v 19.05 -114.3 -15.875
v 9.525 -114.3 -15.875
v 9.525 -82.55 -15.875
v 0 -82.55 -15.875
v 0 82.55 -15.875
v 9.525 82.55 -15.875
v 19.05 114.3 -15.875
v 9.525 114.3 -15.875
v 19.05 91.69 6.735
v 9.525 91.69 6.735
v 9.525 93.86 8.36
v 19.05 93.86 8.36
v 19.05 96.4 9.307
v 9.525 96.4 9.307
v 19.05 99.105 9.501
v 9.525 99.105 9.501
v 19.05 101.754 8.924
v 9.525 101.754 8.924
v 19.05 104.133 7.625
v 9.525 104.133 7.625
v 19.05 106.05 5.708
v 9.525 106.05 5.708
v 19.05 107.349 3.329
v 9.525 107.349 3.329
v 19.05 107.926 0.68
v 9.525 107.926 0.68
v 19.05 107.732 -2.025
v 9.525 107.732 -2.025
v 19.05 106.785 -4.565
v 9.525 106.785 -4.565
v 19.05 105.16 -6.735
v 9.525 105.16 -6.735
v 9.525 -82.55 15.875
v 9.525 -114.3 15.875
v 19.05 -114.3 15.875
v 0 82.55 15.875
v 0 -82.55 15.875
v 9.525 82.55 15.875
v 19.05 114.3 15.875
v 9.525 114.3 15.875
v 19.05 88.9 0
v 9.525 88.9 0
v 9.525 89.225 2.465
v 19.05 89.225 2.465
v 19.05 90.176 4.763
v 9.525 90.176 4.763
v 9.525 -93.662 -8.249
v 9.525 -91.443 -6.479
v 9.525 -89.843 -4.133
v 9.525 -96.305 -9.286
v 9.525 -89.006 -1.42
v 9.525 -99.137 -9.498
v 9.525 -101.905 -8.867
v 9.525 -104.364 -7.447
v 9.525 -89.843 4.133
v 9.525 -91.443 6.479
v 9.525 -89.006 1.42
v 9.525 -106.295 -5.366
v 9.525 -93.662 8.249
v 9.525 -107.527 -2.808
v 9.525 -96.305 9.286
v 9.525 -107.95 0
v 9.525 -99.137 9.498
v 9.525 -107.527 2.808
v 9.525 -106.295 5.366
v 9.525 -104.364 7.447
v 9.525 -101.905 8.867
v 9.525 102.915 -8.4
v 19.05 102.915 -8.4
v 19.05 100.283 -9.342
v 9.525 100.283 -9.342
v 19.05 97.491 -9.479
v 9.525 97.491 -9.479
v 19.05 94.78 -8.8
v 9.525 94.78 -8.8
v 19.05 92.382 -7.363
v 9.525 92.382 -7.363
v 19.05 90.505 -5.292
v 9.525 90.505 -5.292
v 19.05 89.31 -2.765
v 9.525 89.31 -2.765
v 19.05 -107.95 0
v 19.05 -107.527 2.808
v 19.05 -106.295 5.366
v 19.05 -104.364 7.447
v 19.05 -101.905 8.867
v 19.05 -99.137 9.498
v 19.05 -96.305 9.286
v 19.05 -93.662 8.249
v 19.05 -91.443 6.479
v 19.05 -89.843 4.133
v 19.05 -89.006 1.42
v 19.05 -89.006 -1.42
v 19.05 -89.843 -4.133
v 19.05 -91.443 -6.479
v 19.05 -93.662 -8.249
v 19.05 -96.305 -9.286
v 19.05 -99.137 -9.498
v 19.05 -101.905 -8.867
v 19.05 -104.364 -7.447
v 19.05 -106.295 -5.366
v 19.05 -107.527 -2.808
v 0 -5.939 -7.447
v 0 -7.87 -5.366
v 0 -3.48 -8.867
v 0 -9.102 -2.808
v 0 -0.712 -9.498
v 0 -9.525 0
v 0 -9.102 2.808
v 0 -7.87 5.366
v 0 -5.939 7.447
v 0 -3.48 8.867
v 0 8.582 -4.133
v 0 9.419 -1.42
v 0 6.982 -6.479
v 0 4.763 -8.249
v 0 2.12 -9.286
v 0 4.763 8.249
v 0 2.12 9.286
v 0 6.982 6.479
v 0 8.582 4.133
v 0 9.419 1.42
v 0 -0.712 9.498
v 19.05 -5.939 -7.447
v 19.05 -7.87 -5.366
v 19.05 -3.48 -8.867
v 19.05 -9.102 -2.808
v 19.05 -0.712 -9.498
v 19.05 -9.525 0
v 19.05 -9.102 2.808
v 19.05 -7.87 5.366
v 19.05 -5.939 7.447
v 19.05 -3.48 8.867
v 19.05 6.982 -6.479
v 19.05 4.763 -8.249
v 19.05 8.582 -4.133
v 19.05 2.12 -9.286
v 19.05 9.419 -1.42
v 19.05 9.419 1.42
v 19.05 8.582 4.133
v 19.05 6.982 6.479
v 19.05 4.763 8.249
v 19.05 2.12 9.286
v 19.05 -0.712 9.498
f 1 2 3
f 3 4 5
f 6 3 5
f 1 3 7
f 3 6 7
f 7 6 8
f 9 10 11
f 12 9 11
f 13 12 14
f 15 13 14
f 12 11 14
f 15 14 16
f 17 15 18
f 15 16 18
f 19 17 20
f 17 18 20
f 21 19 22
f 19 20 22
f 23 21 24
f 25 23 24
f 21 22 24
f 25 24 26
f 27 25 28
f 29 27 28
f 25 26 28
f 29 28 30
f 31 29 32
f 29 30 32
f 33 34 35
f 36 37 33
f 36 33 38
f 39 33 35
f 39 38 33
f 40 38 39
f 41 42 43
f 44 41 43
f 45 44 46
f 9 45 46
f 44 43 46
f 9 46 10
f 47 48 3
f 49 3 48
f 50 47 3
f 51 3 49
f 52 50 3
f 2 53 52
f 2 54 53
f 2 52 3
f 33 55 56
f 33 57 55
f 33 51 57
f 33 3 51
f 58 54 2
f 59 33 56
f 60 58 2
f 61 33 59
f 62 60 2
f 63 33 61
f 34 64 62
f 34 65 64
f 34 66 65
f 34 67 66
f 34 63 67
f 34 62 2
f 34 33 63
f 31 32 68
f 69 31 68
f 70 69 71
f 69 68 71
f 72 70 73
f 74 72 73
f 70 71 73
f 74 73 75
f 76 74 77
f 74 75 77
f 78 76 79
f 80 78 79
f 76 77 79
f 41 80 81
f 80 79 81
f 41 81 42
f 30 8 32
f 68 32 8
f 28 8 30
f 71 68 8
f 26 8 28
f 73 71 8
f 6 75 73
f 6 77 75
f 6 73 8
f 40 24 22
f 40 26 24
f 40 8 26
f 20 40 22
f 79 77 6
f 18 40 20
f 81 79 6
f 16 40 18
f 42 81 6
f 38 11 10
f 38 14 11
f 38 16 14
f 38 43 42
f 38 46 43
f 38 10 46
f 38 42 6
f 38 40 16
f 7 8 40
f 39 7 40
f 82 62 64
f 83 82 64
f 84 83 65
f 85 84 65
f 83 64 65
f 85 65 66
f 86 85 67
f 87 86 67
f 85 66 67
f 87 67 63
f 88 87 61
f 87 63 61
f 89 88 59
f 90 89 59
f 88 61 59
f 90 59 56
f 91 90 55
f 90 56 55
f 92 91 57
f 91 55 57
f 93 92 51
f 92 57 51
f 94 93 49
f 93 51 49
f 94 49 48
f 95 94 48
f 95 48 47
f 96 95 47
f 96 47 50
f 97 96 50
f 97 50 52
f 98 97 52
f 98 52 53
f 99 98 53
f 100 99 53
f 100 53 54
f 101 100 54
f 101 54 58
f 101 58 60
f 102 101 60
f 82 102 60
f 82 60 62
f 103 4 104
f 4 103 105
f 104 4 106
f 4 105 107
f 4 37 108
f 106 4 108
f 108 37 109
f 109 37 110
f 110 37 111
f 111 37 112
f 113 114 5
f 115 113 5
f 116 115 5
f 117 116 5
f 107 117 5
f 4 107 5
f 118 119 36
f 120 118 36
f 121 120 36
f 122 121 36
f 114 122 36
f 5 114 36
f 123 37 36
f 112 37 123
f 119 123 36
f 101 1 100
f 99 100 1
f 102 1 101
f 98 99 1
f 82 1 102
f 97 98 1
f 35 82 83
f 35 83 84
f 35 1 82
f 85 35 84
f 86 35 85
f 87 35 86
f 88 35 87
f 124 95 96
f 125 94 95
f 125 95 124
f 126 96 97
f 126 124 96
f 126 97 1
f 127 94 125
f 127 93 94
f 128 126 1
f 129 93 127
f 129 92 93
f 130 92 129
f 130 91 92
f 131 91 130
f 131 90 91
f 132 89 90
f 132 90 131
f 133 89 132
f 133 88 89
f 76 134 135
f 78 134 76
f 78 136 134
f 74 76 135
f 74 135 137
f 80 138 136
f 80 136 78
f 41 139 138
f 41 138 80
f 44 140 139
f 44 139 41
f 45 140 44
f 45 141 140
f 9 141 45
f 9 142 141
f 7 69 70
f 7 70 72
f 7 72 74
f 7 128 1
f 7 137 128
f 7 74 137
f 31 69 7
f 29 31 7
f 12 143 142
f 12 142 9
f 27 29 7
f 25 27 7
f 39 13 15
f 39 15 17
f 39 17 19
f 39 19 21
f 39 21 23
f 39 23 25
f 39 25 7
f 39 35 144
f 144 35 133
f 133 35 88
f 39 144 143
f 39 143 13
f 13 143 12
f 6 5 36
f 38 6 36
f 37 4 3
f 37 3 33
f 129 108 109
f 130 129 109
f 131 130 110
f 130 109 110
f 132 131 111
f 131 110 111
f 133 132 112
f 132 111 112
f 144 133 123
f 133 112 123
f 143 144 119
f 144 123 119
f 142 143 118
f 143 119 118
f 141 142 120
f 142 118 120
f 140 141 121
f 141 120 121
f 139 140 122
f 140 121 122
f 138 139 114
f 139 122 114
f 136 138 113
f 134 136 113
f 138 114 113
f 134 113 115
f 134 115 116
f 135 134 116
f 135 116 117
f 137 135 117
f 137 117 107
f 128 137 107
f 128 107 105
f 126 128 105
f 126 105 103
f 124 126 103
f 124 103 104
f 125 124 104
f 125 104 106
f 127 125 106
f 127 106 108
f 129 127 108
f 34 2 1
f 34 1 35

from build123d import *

# Parameters (mm, degrees)
F0_W     = 228.6
F0_H     = 31.75
F1_DEPTH = 19.05
F2_W     = 31.75
F2_H     = 31.75
F3_DEPTH = 9.525
F4_R     = 9.525
F5_DEPTH = 25.4
F6_R     = 9.525
F7_DEPTH = 25.4


with BuildPart() as f1:
    # F0 (on Right) → F1 (new body)
    with BuildSketch(Plane.YZ):
        Rectangle(F0_W, F0_H)
    extrude(amount=F1_DEPTH)

    # F2 (on face) → F3 (cut)
    with BuildSketch(Plane(origin=(0, 0, 0), x_dir=(0, -1, 0), z_dir=(-1, 0, 0))):
        with Locations((-98.425, 0)):
            Rectangle(F2_W, F2_H)
        with Locations((98.425, 0)):
            Rectangle(F2_W, F2_H)
    extrude(amount=-F3_DEPTH, mode=Mode.SUBTRACT)

    # F4 (on face) → F5 (cut)
    with BuildSketch(Plane(origin=(9.525, 0, 0), x_dir=(0, -1, 0), z_dir=(-1, 0, 0))):
        with BuildLine():
            ThreePointArc((-91.689808, 6.735192), (-105.160192, 6.735192), (-105.160192, -6.735192))
            Line((-105.160192, -6.735192), (-91.689808, 6.735192))
        make_face()
        with BuildLine():
            Line((-91.689808, 6.735192), (-105.160192, -6.735192))
            ThreePointArc((-105.160192, -6.735192), (-94.77994, -8.799953), (-88.9, 0))
            ThreePointArc((-88.9, 0), (-89.625047, 3.64506), (-91.689808, 6.735192))
        make_face()
        with Locations((98.425, 0)):
            Circle(F4_R)
    extrude(amount=-F5_DEPTH, mode=Mode.SUBTRACT)

    # F6 (on face) → F7 (cut)
    with BuildSketch(Plane(origin=(0, 0, 0), x_dir=(0, -1, 0), z_dir=(-1, 0, 0))):
        Circle(F6_R)
    extrude(amount=-F7_DEPTH, mode=Mode.SUBTRACT)


solid = f1.part
